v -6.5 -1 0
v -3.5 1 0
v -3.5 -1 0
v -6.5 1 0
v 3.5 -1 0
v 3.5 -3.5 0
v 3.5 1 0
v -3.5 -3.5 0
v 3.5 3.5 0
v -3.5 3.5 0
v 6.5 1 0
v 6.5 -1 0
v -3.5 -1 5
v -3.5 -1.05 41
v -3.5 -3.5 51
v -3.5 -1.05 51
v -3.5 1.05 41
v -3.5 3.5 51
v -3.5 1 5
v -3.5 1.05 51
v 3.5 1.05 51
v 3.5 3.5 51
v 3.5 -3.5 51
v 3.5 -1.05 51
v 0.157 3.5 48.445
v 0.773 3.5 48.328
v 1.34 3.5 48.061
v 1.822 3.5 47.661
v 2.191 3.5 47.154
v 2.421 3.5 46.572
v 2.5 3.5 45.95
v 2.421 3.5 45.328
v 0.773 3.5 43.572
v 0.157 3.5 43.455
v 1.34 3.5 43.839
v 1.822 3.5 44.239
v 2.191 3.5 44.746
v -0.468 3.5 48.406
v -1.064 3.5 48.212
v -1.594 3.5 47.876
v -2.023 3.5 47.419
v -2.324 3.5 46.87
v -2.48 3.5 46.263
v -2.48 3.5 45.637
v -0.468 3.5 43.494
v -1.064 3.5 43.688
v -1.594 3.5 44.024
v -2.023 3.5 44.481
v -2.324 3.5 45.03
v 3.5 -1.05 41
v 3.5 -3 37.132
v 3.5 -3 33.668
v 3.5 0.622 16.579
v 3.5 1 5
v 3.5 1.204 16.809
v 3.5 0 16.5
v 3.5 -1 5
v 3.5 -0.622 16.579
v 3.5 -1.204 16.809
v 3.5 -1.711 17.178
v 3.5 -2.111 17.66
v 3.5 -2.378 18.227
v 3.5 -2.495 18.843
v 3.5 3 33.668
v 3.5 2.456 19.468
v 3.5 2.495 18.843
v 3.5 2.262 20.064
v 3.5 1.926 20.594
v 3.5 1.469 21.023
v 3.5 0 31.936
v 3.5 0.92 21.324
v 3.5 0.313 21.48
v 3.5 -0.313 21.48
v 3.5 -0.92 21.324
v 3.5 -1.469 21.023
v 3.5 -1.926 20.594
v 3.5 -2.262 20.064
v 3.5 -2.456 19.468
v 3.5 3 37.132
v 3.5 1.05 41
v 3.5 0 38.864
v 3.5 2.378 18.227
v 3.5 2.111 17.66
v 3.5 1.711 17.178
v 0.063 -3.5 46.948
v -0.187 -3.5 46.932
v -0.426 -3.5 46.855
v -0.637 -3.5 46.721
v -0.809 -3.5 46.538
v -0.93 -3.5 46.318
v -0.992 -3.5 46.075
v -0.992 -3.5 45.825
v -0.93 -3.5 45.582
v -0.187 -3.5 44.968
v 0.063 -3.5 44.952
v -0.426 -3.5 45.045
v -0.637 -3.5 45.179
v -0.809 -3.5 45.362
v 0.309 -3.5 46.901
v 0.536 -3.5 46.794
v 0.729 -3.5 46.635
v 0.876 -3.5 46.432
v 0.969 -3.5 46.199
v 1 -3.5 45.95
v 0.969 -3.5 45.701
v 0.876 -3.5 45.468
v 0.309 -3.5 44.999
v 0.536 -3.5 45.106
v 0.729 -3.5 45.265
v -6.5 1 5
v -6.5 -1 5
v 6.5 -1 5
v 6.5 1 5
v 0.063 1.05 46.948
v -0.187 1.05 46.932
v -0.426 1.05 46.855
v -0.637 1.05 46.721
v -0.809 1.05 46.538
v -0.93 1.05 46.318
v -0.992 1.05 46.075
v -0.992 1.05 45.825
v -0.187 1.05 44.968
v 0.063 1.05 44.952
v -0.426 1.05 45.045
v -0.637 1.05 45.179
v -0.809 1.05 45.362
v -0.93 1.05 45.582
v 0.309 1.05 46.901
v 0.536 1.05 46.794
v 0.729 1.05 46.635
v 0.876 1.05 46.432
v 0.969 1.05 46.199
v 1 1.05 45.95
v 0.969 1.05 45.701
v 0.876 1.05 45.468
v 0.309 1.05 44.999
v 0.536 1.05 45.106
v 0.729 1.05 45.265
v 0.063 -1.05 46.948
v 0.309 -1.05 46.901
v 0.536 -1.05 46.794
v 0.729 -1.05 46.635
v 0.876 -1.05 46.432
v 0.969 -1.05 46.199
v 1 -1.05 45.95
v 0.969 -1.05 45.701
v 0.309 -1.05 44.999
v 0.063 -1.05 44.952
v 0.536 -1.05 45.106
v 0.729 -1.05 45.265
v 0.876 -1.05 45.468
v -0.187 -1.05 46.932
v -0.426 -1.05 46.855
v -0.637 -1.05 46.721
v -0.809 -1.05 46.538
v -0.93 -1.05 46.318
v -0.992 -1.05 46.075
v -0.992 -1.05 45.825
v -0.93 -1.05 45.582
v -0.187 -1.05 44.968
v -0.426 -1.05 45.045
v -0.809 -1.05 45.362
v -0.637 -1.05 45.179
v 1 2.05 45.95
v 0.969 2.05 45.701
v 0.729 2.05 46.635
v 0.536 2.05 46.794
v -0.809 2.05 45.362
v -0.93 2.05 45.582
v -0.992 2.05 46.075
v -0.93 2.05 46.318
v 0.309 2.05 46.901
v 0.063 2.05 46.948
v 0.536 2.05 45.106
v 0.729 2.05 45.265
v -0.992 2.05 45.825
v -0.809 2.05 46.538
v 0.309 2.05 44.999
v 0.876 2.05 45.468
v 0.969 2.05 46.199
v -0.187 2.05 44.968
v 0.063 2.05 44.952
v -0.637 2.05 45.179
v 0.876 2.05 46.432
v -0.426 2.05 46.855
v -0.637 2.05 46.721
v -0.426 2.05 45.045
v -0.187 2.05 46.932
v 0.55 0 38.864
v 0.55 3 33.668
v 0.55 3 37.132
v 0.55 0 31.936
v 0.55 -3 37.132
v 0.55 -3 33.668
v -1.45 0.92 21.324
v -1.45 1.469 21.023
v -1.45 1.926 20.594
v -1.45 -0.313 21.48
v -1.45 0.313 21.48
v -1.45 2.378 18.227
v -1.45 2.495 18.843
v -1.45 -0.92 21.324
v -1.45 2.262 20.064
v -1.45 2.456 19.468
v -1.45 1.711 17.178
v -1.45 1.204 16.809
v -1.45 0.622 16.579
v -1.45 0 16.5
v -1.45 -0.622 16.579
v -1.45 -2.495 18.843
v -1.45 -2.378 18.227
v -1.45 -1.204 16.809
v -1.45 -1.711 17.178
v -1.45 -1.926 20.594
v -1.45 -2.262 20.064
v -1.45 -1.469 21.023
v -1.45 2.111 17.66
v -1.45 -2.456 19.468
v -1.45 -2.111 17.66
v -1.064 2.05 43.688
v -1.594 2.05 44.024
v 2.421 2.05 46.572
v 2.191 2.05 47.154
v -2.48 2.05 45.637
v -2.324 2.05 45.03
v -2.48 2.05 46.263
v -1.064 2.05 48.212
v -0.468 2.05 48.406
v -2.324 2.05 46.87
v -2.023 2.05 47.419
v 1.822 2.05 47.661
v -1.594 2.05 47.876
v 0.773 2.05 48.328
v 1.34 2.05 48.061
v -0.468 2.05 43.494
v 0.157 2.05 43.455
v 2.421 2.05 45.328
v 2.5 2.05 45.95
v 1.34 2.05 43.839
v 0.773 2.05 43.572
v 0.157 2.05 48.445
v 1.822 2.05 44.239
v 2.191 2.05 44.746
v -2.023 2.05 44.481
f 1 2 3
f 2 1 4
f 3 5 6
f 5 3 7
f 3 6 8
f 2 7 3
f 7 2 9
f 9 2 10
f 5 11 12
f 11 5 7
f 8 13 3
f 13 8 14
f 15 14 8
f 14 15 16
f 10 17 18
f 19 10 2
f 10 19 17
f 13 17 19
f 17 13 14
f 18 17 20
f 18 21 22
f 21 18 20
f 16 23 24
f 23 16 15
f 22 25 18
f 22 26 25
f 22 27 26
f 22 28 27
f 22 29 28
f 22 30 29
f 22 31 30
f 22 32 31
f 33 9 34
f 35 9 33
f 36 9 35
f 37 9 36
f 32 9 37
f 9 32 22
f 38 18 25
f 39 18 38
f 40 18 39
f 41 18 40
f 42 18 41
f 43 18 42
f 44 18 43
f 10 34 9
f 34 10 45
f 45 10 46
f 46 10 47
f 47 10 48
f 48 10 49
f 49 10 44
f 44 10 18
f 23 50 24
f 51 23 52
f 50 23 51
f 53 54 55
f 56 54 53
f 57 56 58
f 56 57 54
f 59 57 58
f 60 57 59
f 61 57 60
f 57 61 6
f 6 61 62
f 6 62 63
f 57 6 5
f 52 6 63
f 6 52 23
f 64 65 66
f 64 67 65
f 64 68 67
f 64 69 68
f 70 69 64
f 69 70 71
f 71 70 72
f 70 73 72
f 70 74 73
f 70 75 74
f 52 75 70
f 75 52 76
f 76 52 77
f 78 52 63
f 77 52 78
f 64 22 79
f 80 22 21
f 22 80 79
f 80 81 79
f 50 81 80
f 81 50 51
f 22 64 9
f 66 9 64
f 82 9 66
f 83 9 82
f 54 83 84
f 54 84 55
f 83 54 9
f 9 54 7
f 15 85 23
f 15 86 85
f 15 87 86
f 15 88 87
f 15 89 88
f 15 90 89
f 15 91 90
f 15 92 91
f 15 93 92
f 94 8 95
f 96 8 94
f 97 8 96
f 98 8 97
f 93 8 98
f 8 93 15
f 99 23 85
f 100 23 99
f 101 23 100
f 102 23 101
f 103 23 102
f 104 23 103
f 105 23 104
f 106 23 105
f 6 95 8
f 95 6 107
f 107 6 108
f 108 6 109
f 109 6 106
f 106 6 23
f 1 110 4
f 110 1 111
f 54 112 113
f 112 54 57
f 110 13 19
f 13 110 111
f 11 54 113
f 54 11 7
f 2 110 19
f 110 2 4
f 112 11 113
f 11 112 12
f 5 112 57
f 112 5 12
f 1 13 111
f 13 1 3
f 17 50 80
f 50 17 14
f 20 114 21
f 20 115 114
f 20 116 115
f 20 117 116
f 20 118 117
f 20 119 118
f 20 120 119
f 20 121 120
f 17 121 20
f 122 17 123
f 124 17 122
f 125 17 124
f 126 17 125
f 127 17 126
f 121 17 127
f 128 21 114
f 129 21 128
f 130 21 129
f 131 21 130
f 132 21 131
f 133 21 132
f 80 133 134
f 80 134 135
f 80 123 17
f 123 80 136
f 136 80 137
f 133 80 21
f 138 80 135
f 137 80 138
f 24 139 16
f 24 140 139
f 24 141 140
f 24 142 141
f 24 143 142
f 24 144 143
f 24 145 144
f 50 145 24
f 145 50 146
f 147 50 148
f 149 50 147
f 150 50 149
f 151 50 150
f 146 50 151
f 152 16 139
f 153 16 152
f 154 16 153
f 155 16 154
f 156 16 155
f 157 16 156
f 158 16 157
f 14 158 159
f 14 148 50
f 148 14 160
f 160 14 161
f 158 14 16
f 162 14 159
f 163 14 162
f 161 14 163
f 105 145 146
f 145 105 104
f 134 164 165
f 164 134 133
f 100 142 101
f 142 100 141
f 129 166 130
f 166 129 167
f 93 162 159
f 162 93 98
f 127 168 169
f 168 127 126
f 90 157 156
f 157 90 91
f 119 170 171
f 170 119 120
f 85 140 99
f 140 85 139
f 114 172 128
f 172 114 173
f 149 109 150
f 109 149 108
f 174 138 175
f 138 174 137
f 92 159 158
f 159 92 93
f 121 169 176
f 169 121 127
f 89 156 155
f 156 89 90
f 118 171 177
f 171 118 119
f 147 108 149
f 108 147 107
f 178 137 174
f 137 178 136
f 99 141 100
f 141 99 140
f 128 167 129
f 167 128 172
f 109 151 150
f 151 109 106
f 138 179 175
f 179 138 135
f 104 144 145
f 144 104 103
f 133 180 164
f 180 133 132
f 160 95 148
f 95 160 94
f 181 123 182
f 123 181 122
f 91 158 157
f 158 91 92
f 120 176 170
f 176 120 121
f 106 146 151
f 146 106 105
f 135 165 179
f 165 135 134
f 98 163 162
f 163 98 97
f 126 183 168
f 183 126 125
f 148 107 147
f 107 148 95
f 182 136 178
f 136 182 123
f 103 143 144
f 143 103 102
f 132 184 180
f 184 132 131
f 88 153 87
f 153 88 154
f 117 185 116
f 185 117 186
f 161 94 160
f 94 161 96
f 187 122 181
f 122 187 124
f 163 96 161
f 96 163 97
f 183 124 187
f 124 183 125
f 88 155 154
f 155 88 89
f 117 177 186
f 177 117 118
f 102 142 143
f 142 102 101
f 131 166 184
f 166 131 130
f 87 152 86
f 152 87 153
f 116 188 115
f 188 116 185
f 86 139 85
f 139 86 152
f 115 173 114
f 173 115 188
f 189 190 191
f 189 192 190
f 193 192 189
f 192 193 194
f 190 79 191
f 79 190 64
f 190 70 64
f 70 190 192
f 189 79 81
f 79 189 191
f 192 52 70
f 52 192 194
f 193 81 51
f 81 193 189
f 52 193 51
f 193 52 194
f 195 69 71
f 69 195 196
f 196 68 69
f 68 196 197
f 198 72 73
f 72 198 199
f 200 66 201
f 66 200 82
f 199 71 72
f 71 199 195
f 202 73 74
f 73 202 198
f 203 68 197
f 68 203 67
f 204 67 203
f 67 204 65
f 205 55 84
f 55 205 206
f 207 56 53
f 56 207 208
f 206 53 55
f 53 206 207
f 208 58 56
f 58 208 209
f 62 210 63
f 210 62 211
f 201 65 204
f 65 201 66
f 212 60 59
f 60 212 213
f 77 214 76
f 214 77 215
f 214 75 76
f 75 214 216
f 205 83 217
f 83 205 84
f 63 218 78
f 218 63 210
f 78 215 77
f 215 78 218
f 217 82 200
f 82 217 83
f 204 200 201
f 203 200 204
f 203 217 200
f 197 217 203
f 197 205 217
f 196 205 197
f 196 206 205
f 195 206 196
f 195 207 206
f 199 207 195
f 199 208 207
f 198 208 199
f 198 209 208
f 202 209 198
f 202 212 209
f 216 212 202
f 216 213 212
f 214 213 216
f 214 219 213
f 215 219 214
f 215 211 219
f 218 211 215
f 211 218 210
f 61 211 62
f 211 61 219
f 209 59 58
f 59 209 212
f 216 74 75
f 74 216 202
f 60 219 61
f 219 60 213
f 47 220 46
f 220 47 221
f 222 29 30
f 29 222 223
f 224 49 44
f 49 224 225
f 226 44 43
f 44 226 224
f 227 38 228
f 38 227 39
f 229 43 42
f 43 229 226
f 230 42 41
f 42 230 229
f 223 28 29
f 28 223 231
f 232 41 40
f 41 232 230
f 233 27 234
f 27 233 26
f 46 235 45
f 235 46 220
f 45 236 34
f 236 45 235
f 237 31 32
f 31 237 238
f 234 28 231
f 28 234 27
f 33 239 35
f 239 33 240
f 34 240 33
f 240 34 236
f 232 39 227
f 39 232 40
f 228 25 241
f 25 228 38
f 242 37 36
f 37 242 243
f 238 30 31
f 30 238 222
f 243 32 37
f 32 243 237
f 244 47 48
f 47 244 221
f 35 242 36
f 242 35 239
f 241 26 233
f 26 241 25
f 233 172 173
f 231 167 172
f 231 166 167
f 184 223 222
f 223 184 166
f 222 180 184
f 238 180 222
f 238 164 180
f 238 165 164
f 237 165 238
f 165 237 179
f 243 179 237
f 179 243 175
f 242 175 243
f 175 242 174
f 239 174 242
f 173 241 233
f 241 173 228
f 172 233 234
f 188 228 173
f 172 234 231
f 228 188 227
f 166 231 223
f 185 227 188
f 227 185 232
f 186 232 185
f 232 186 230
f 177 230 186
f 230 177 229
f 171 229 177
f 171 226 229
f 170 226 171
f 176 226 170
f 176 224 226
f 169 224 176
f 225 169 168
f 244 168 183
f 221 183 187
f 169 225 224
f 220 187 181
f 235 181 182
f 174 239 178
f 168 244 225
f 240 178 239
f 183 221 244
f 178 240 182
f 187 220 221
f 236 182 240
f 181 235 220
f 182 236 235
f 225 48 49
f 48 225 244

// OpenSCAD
stick_size = [
    7,
    7,
    51
];

fin_spring_size = [
    stick_size.x + 6,
    2,
    5
];

fin_cut_size = [
    stick_size.x + 1,
    2.1,
    10.1
];

fin_cut_pos = [
    0,
    0,
    stick_size.z - fin_cut_size.z + 0.1 
];

fin_mount_hole_size = [
    2,
    stick_size.y + 0.1
];

fin_mount_rotate = [
    90,
    0,
    0
];

fin_mount_pos = [
    0,
    0,
    stick_size.z - fin_cut_size.z/2
];

nut_hole_size = [
    6,
    3.1
];

nut_hole_rotate = [
    90,
    90,
    90
];

nut_hole_pos = [
    (stick_size.y - nut_hole_size.y + 0.1)/2 + 0.1,
    0,
    stick_size.z - fin_cut_size.z - 5.5
];

magnes_hole_size = [
    5,
    5.1
];

magnes_hole_rotate = [
    90,
    90,
    90
];

magnes_hole_pos = [
    (stick_size.y - magnes_hole_size.y + 0.1)/2 + 0.1,
    0,
    19
];

mount_hole_size = [
    5,
    1.6
];

mount_hole_rotate = [
    90,
    0,
    0
];

mount_hole_pos = [
    0,
    (stick_size.y - mount_hole_size.y + 0.1)/2 + 0.1,
    fin_mount_pos.z
];

module block(size) {
    linear_extrude(height=size.z)
    square([size.x, size.y], center=true);
};

module clinch(size) {
    $fn = 25;
    translate(
        [
            0,
            0,
            -size.y/2
        ]
    )
    linear_extrude(height=size.y)
    circle(size.x/2, center=true);
};

module stick() {
    block(stick_size);
    block(fin_spring_size);
};

module hexagon(size) {
    x = size.x/sqrt(3);
    translate(
        [
            0,
            0,
            -size.y/2
        ]
    )
    linear_extrude(height=size.y)
    polygon(
        [
            [-x, 0],
            [-x/2, x*sqrt(3)/2],
            [x/2, x*sqrt(3)/2],
            [x, 0],
            [x/2, -x*sqrt(3)/2],
            [-x/2, -x*sqrt(3)/2]
        ]
    );
};

difference() {
    stick();
    translate(fin_cut_pos)
    block(fin_cut_size);
    
    translate(fin_mount_pos)
    rotate(fin_mount_rotate)
    clinch(fin_mount_hole_size);
    
    translate(nut_hole_pos)
    rotate(nut_hole_rotate)
    hexagon(nut_hole_size);
    
    translate(magnes_hole_pos)
    rotate(magnes_hole_rotate)
    clinch(magnes_hole_size);
    
    translate(mount_hole_pos)
    rotate(mount_hole_rotate)
    clinch(mount_hole_size);
};
